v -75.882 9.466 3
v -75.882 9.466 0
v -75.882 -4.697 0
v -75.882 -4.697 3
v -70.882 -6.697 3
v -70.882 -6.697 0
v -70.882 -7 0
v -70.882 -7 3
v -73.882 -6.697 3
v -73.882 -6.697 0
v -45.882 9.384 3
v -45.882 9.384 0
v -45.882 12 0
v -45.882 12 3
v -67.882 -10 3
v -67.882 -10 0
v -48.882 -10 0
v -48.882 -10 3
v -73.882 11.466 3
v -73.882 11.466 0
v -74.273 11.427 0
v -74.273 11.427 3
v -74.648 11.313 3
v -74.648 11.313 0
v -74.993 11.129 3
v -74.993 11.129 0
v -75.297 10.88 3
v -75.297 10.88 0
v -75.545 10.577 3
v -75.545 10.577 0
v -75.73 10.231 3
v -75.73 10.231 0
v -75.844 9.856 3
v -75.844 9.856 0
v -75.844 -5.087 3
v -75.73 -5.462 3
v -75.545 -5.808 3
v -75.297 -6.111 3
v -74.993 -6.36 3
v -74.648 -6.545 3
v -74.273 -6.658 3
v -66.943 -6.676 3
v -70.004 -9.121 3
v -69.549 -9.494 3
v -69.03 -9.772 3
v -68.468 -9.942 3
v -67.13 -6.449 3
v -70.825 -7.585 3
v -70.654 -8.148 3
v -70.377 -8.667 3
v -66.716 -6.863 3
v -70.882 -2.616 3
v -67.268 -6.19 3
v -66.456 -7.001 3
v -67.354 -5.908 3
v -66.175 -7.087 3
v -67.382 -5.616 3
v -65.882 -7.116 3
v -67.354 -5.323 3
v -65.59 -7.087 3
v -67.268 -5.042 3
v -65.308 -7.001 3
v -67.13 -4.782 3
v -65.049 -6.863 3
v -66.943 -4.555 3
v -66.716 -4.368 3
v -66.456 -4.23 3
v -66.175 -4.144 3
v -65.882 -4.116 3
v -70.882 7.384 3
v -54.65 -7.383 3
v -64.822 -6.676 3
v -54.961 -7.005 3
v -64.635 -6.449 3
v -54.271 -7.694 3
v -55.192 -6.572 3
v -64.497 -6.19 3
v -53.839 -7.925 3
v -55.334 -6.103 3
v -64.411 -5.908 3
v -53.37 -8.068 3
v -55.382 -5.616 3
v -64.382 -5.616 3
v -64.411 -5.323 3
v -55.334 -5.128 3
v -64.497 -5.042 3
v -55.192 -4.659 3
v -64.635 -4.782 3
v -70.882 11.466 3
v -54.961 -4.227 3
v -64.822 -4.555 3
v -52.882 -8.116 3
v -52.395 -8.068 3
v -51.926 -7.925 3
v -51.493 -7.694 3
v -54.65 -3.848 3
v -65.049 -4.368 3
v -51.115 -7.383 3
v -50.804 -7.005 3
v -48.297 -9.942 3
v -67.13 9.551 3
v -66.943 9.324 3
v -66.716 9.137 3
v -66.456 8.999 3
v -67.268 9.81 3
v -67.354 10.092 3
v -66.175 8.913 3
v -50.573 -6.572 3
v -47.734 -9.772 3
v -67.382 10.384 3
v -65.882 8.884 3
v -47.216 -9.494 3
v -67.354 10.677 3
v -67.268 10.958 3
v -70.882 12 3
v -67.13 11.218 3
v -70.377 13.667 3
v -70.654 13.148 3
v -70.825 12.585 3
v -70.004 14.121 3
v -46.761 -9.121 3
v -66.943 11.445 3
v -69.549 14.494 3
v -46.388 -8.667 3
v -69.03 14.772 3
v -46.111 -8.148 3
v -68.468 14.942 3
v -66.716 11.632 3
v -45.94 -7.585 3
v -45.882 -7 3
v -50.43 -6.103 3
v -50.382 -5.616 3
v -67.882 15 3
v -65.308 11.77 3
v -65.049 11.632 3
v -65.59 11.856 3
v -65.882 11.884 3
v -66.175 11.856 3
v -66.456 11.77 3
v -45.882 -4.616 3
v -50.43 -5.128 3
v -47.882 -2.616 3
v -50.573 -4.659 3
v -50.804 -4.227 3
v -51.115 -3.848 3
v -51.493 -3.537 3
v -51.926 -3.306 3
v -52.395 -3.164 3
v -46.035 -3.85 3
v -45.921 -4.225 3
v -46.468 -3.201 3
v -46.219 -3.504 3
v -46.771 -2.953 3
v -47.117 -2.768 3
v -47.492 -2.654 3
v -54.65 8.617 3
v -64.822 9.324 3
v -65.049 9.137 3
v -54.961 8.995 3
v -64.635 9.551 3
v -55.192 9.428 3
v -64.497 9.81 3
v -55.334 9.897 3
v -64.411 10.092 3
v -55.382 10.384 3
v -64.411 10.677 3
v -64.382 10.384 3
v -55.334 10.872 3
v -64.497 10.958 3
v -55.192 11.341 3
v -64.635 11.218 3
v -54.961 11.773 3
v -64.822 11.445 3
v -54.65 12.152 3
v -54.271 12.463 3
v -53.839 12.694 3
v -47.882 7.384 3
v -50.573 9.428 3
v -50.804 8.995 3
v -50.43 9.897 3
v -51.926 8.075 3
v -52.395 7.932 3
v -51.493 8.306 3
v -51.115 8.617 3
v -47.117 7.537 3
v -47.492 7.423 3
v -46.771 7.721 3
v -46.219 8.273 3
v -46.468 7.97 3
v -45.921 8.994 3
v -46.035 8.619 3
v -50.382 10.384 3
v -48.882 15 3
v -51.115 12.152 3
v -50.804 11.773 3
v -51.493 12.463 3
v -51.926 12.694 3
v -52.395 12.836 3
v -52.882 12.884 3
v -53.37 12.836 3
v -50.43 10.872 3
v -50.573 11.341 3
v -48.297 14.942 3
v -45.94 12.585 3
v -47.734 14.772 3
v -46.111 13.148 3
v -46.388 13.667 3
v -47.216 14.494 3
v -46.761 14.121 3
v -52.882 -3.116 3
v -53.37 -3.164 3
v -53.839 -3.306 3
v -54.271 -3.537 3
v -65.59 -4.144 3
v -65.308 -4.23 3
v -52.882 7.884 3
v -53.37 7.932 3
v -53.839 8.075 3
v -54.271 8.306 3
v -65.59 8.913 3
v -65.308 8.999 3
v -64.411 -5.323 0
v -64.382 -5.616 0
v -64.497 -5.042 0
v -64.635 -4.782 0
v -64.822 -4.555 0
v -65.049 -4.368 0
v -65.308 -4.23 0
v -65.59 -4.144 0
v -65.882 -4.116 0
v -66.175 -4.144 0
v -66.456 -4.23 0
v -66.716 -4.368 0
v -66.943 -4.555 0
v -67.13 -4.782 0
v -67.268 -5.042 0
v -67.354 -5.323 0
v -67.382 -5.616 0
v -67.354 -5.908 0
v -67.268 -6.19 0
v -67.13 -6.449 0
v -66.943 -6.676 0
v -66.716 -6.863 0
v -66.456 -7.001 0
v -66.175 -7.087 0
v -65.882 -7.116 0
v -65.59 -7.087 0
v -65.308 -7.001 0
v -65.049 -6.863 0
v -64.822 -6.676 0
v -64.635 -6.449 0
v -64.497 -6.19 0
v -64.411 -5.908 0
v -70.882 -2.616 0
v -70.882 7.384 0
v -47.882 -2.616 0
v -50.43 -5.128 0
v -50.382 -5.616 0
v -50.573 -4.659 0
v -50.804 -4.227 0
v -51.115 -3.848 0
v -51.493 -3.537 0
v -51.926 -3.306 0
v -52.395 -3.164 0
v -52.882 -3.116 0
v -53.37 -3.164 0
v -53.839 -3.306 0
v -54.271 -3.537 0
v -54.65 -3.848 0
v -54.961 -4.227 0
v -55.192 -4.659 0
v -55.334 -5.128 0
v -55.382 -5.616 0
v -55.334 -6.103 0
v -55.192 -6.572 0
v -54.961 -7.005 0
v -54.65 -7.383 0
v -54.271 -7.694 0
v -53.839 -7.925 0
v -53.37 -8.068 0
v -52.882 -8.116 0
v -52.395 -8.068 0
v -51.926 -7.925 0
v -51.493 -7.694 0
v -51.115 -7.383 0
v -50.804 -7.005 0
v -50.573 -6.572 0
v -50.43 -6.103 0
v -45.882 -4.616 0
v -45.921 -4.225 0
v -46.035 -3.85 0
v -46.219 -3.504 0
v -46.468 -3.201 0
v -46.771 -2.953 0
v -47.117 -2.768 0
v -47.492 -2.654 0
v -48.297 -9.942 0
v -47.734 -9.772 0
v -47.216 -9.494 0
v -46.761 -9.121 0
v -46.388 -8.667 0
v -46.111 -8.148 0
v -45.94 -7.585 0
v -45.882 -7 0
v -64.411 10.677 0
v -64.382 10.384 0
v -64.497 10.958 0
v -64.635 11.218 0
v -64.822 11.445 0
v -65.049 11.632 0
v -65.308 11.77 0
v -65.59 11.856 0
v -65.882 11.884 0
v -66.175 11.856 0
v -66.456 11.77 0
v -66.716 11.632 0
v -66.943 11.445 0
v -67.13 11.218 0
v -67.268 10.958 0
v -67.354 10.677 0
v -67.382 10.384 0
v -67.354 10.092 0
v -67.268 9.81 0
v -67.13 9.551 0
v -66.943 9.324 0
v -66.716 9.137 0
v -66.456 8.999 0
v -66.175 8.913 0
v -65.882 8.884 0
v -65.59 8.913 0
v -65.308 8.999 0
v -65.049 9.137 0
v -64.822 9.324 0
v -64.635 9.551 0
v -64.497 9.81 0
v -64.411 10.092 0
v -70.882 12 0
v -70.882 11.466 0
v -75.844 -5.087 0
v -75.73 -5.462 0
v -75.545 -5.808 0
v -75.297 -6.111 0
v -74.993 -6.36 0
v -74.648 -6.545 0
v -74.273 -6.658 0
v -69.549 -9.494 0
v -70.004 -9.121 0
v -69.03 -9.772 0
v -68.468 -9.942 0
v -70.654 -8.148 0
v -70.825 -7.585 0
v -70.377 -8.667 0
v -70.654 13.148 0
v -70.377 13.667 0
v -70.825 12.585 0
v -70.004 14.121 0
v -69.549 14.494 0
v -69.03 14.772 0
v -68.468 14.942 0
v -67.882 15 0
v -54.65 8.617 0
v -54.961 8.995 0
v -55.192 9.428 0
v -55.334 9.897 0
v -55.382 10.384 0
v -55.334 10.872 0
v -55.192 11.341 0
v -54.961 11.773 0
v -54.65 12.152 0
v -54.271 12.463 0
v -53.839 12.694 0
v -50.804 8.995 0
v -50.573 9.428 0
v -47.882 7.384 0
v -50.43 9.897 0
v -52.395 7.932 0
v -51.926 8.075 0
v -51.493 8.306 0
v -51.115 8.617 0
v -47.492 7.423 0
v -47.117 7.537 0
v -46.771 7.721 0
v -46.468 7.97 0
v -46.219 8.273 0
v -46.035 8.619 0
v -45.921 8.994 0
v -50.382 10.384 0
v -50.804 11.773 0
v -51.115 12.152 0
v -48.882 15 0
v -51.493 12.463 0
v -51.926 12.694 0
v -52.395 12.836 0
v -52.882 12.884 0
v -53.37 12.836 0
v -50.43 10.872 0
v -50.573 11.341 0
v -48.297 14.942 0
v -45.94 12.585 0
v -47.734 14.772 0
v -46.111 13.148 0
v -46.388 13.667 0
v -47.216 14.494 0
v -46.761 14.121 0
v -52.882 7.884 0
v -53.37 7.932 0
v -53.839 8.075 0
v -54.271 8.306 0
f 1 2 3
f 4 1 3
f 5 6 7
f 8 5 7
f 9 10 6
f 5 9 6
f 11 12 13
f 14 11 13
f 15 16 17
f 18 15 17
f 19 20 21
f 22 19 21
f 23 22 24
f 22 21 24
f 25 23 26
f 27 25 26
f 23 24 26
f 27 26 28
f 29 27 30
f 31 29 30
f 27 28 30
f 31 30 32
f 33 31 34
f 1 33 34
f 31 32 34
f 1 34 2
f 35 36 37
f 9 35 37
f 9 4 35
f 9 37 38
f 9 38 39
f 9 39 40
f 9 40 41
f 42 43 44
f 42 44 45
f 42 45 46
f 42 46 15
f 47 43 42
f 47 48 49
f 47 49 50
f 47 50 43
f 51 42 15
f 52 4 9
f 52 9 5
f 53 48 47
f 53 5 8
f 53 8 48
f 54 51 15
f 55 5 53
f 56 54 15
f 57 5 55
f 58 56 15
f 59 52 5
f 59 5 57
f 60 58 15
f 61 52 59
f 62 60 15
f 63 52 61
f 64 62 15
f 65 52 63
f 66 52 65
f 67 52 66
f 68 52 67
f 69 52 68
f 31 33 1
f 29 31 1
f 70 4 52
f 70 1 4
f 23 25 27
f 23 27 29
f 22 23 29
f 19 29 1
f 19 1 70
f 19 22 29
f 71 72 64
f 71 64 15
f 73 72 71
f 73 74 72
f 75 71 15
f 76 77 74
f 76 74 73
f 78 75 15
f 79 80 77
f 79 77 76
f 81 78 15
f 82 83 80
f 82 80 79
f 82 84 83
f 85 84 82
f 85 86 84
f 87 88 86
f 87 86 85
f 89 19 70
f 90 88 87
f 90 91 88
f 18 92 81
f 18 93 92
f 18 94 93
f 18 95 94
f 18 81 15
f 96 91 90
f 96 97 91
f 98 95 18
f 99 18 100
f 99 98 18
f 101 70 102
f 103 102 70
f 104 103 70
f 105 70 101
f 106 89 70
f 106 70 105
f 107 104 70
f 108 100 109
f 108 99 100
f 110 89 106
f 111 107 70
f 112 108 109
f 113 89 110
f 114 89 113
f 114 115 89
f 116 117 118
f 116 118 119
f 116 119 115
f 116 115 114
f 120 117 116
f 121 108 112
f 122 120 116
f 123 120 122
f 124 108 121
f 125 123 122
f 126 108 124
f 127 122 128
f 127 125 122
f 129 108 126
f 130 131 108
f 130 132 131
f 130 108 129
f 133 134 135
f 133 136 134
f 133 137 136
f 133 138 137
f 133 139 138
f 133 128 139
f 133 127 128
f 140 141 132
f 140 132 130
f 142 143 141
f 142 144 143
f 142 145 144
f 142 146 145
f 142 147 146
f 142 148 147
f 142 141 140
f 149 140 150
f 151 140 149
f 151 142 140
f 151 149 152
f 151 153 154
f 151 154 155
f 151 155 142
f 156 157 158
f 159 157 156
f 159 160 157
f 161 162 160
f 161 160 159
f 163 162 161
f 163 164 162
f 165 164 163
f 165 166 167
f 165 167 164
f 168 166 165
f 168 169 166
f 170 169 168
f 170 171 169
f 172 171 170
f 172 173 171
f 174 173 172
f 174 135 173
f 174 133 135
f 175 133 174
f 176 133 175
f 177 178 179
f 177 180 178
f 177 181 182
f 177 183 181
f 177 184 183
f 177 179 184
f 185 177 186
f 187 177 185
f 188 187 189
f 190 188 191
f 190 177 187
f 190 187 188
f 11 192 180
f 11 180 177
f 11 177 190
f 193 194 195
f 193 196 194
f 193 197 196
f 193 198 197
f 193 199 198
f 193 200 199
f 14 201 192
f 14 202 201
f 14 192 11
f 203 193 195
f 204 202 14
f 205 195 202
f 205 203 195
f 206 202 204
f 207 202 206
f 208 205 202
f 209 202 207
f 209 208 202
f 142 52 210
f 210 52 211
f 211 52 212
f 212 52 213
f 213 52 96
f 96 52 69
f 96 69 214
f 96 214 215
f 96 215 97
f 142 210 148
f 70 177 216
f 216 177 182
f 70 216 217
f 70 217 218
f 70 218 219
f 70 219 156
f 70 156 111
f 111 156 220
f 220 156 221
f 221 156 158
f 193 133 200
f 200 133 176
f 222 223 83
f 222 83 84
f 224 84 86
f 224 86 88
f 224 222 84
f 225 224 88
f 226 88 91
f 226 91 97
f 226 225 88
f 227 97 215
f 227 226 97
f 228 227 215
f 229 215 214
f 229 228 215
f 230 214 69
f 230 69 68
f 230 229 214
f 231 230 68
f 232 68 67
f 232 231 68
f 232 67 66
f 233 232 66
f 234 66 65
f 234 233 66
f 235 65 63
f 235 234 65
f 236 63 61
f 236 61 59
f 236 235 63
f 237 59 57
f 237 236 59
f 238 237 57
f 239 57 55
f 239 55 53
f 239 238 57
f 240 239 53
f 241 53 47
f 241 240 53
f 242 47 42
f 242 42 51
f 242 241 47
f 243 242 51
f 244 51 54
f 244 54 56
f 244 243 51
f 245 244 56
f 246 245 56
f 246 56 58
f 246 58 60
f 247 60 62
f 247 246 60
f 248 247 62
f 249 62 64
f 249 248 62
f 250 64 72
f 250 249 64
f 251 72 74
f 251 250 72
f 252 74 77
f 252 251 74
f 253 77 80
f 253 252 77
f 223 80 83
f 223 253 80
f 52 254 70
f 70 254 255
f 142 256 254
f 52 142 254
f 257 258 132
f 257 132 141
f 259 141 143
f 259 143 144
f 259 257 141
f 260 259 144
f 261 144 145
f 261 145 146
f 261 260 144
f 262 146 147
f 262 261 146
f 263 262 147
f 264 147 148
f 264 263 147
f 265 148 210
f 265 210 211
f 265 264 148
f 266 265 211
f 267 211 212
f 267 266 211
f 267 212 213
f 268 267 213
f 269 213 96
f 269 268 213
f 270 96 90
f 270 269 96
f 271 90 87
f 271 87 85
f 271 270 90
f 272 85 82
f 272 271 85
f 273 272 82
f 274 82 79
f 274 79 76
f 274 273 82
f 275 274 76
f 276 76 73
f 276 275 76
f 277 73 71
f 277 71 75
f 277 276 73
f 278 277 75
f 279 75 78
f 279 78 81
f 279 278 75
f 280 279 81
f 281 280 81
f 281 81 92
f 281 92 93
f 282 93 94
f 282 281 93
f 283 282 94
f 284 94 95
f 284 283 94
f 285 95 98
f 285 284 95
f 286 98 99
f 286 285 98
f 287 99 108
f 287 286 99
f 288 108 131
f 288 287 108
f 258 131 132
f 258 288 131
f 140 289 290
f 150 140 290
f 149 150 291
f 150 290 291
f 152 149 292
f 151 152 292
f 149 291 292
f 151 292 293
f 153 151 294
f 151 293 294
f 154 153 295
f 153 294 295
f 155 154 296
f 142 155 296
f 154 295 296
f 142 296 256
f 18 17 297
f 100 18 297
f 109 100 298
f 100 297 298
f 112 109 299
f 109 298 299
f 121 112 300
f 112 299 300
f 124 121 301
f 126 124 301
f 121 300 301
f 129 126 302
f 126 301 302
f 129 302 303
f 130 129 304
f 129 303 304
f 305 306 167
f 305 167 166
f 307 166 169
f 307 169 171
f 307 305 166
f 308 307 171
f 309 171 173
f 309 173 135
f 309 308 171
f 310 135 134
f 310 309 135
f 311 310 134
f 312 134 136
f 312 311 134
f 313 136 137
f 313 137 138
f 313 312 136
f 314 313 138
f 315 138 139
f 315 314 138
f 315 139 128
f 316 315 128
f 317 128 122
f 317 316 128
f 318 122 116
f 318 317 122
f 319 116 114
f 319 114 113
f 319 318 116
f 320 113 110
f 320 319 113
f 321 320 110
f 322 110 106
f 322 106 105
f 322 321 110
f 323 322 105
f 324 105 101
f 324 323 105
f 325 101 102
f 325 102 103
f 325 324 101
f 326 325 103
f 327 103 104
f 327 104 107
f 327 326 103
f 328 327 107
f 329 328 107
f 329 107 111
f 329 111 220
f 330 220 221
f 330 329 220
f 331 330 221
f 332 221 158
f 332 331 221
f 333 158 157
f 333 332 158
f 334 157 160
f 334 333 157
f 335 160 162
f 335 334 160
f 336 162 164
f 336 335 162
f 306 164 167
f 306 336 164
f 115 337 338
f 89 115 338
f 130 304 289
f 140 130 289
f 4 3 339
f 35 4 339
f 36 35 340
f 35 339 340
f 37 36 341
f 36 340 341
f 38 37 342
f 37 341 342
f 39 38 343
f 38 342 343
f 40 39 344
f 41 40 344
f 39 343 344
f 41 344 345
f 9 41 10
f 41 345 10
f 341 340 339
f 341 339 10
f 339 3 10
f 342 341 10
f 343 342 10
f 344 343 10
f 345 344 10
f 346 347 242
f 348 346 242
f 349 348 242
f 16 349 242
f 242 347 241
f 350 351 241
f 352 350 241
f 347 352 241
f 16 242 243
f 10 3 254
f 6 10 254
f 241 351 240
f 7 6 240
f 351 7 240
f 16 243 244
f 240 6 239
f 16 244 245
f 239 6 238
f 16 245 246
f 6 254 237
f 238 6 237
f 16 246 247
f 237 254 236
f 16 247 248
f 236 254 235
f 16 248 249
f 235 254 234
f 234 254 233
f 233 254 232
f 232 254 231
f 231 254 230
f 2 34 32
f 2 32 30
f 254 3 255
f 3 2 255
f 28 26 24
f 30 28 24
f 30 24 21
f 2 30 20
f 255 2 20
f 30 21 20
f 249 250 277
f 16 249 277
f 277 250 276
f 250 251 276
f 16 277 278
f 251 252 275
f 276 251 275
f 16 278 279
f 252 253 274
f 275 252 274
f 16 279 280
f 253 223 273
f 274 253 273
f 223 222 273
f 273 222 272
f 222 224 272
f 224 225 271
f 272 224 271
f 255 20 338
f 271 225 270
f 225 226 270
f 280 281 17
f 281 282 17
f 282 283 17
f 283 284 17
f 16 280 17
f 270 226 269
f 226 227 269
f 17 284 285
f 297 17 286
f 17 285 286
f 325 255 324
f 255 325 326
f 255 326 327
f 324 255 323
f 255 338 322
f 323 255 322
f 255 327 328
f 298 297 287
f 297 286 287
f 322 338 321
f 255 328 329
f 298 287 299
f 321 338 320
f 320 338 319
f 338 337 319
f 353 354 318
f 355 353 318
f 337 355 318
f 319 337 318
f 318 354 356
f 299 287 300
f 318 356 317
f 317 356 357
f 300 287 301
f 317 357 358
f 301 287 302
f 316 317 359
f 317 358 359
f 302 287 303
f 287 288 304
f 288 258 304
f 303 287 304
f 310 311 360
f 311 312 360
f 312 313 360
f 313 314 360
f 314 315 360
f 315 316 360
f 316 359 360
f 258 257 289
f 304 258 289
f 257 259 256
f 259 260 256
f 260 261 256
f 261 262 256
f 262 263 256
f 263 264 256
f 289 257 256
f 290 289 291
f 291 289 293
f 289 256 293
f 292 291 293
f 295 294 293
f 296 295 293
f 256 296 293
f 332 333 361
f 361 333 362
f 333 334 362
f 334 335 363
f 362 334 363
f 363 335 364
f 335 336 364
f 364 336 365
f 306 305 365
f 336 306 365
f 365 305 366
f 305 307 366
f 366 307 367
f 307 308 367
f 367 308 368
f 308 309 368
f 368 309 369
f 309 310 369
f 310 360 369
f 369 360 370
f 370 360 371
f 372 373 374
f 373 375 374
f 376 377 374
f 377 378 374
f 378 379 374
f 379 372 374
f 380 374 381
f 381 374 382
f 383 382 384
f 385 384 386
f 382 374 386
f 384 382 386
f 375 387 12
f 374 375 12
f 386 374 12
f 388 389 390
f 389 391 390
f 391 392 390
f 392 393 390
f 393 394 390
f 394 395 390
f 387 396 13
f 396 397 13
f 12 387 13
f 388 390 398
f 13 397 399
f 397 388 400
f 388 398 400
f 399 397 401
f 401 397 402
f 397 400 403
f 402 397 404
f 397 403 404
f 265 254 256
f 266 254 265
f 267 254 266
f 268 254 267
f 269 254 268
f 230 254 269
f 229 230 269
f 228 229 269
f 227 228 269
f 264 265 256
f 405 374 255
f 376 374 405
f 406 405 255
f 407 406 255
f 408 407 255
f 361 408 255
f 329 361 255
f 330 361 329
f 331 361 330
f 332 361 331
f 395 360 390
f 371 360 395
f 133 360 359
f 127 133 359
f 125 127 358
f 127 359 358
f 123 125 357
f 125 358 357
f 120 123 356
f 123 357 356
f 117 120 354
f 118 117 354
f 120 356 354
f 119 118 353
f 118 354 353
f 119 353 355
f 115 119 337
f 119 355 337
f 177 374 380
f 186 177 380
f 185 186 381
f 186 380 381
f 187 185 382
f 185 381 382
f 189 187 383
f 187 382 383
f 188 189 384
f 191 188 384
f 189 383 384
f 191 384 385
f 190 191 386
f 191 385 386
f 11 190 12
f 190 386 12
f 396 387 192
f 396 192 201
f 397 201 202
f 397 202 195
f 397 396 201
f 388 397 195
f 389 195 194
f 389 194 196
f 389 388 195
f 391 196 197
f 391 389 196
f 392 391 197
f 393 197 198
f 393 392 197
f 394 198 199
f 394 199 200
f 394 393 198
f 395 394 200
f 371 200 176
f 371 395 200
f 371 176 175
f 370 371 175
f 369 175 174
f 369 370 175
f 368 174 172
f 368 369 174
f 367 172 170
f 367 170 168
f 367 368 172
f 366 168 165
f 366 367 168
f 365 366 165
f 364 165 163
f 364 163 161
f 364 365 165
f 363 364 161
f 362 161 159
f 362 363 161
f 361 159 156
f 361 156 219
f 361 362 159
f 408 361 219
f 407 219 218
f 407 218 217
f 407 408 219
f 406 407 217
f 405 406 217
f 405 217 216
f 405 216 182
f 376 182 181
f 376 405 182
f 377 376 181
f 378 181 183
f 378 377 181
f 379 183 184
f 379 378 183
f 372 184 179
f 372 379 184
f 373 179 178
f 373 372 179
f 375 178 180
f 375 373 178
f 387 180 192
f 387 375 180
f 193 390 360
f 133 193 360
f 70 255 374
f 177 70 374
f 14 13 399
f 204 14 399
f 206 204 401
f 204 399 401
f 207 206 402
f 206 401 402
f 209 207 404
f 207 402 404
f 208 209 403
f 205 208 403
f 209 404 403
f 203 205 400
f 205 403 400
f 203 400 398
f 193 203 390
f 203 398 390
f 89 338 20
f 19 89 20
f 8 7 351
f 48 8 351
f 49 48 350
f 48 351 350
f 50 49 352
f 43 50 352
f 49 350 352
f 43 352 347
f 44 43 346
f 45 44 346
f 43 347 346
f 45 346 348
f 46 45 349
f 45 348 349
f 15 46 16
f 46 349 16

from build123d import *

# Parameters (mm, degrees)
SKETCH1_R           = 2.5
SKETCH1_R_2         = 1.5
BOSS_EXTRUDE1_DEPTH = 3


with BuildPart() as part:
    # Sketch1 → Boss-Extrude1 (new body)
    with BuildSketch(Plane.XY):
        with BuildLine():
            Line((-47.882351022, -2.615594916), (-50.382351022, -2.615594916))
            Line((-50.382351022, -2.615594916), (-55.382351022, -2.615594916))
            Line((-55.382351022, -2.615594916), (-70.882351022, -2.615594916))
            Line((-70.882351022, -2.615594916), (-70.882351022, 7.384405084))
            Line((-70.882351022, 7.384405084), (-55.382351022, 7.384405084))
            Line((-55.382351022, 7.384405084), (-50.382351022, 7.384405084))
            Line((-50.382351022, 7.384405084), (-47.882351022, 7.384405084))
            ThreePointArc((-47.882351022, 7.384405084), (-46.46813746, 7.970191522), (-45.882351022, 9.384405084))
            Line((-45.882351022, 9.384405084), (-45.882351022, 12))
            ThreePointArc((-45.882351022, 12), (-46.761030678, 14.121320344), (-48.882351022, 15))
            Line((-48.882351022, 15), (-67.882351022, 15))
            ThreePointArc((-67.882351022, 15), (-70.003671365, 14.121320344), (-70.882351022, 12))
            Line((-70.882351022, 12), (-70.882351022, 11.465621828))
            Line((-70.882351022, 11.465621828), (-73.882351022, 11.465621828))
            ThreePointArc((-73.882351022, 11.465621828), (-75.296564584, 10.879835391), (-75.882351022, 9.465621828))
            Line((-75.882351022, 9.465621828), (-75.882351022, -4.69681166))
            ThreePointArc((-75.882351022, -4.69681166), (-75.296564584, -6.111025222), (-73.882351022, -6.69681166))
            Line((-73.882351022, -6.69681166), (-70.882351022, -6.69681166))
            Line((-70.882351022, -6.69681166), (-70.882351022, -7))
            ThreePointArc((-70.882351022, -7), (-70.003671365, -9.121320344), (-67.882351022, -10))
            Line((-67.882351022, -10), (-48.882351022, -10))
            ThreePointArc((-48.882351022, -10), (-46.761030678, -9.121320344), (-45.882351022, -7))
            Line((-45.882351022, -7), (-45.882351022, -4.615594916))
            ThreePointArc((-45.882351022, -4.615594916), (-46.46813746, -3.201381353), (-47.882351022, -2.615594916))
        make_face()
        with Locations((-52.882351022, 10.384405084)):
            Circle(SKETCH1_R, mode=Mode.SUBTRACT)
        with Locations((-52.882351022, -5.615594916)):
            Circle(SKETCH1_R, mode=Mode.SUBTRACT)
        with Locations((-65.882351022, 10.384405084)):
            Circle(SKETCH1_R_2, mode=Mode.SUBTRACT)
        with Locations((-65.882351022, -5.615594916)):
            Circle(SKETCH1_R_2, mode=Mode.SUBTRACT)
    extrude(amount=BOSS_EXTRUDE1_DEPTH)


solid = part.part
